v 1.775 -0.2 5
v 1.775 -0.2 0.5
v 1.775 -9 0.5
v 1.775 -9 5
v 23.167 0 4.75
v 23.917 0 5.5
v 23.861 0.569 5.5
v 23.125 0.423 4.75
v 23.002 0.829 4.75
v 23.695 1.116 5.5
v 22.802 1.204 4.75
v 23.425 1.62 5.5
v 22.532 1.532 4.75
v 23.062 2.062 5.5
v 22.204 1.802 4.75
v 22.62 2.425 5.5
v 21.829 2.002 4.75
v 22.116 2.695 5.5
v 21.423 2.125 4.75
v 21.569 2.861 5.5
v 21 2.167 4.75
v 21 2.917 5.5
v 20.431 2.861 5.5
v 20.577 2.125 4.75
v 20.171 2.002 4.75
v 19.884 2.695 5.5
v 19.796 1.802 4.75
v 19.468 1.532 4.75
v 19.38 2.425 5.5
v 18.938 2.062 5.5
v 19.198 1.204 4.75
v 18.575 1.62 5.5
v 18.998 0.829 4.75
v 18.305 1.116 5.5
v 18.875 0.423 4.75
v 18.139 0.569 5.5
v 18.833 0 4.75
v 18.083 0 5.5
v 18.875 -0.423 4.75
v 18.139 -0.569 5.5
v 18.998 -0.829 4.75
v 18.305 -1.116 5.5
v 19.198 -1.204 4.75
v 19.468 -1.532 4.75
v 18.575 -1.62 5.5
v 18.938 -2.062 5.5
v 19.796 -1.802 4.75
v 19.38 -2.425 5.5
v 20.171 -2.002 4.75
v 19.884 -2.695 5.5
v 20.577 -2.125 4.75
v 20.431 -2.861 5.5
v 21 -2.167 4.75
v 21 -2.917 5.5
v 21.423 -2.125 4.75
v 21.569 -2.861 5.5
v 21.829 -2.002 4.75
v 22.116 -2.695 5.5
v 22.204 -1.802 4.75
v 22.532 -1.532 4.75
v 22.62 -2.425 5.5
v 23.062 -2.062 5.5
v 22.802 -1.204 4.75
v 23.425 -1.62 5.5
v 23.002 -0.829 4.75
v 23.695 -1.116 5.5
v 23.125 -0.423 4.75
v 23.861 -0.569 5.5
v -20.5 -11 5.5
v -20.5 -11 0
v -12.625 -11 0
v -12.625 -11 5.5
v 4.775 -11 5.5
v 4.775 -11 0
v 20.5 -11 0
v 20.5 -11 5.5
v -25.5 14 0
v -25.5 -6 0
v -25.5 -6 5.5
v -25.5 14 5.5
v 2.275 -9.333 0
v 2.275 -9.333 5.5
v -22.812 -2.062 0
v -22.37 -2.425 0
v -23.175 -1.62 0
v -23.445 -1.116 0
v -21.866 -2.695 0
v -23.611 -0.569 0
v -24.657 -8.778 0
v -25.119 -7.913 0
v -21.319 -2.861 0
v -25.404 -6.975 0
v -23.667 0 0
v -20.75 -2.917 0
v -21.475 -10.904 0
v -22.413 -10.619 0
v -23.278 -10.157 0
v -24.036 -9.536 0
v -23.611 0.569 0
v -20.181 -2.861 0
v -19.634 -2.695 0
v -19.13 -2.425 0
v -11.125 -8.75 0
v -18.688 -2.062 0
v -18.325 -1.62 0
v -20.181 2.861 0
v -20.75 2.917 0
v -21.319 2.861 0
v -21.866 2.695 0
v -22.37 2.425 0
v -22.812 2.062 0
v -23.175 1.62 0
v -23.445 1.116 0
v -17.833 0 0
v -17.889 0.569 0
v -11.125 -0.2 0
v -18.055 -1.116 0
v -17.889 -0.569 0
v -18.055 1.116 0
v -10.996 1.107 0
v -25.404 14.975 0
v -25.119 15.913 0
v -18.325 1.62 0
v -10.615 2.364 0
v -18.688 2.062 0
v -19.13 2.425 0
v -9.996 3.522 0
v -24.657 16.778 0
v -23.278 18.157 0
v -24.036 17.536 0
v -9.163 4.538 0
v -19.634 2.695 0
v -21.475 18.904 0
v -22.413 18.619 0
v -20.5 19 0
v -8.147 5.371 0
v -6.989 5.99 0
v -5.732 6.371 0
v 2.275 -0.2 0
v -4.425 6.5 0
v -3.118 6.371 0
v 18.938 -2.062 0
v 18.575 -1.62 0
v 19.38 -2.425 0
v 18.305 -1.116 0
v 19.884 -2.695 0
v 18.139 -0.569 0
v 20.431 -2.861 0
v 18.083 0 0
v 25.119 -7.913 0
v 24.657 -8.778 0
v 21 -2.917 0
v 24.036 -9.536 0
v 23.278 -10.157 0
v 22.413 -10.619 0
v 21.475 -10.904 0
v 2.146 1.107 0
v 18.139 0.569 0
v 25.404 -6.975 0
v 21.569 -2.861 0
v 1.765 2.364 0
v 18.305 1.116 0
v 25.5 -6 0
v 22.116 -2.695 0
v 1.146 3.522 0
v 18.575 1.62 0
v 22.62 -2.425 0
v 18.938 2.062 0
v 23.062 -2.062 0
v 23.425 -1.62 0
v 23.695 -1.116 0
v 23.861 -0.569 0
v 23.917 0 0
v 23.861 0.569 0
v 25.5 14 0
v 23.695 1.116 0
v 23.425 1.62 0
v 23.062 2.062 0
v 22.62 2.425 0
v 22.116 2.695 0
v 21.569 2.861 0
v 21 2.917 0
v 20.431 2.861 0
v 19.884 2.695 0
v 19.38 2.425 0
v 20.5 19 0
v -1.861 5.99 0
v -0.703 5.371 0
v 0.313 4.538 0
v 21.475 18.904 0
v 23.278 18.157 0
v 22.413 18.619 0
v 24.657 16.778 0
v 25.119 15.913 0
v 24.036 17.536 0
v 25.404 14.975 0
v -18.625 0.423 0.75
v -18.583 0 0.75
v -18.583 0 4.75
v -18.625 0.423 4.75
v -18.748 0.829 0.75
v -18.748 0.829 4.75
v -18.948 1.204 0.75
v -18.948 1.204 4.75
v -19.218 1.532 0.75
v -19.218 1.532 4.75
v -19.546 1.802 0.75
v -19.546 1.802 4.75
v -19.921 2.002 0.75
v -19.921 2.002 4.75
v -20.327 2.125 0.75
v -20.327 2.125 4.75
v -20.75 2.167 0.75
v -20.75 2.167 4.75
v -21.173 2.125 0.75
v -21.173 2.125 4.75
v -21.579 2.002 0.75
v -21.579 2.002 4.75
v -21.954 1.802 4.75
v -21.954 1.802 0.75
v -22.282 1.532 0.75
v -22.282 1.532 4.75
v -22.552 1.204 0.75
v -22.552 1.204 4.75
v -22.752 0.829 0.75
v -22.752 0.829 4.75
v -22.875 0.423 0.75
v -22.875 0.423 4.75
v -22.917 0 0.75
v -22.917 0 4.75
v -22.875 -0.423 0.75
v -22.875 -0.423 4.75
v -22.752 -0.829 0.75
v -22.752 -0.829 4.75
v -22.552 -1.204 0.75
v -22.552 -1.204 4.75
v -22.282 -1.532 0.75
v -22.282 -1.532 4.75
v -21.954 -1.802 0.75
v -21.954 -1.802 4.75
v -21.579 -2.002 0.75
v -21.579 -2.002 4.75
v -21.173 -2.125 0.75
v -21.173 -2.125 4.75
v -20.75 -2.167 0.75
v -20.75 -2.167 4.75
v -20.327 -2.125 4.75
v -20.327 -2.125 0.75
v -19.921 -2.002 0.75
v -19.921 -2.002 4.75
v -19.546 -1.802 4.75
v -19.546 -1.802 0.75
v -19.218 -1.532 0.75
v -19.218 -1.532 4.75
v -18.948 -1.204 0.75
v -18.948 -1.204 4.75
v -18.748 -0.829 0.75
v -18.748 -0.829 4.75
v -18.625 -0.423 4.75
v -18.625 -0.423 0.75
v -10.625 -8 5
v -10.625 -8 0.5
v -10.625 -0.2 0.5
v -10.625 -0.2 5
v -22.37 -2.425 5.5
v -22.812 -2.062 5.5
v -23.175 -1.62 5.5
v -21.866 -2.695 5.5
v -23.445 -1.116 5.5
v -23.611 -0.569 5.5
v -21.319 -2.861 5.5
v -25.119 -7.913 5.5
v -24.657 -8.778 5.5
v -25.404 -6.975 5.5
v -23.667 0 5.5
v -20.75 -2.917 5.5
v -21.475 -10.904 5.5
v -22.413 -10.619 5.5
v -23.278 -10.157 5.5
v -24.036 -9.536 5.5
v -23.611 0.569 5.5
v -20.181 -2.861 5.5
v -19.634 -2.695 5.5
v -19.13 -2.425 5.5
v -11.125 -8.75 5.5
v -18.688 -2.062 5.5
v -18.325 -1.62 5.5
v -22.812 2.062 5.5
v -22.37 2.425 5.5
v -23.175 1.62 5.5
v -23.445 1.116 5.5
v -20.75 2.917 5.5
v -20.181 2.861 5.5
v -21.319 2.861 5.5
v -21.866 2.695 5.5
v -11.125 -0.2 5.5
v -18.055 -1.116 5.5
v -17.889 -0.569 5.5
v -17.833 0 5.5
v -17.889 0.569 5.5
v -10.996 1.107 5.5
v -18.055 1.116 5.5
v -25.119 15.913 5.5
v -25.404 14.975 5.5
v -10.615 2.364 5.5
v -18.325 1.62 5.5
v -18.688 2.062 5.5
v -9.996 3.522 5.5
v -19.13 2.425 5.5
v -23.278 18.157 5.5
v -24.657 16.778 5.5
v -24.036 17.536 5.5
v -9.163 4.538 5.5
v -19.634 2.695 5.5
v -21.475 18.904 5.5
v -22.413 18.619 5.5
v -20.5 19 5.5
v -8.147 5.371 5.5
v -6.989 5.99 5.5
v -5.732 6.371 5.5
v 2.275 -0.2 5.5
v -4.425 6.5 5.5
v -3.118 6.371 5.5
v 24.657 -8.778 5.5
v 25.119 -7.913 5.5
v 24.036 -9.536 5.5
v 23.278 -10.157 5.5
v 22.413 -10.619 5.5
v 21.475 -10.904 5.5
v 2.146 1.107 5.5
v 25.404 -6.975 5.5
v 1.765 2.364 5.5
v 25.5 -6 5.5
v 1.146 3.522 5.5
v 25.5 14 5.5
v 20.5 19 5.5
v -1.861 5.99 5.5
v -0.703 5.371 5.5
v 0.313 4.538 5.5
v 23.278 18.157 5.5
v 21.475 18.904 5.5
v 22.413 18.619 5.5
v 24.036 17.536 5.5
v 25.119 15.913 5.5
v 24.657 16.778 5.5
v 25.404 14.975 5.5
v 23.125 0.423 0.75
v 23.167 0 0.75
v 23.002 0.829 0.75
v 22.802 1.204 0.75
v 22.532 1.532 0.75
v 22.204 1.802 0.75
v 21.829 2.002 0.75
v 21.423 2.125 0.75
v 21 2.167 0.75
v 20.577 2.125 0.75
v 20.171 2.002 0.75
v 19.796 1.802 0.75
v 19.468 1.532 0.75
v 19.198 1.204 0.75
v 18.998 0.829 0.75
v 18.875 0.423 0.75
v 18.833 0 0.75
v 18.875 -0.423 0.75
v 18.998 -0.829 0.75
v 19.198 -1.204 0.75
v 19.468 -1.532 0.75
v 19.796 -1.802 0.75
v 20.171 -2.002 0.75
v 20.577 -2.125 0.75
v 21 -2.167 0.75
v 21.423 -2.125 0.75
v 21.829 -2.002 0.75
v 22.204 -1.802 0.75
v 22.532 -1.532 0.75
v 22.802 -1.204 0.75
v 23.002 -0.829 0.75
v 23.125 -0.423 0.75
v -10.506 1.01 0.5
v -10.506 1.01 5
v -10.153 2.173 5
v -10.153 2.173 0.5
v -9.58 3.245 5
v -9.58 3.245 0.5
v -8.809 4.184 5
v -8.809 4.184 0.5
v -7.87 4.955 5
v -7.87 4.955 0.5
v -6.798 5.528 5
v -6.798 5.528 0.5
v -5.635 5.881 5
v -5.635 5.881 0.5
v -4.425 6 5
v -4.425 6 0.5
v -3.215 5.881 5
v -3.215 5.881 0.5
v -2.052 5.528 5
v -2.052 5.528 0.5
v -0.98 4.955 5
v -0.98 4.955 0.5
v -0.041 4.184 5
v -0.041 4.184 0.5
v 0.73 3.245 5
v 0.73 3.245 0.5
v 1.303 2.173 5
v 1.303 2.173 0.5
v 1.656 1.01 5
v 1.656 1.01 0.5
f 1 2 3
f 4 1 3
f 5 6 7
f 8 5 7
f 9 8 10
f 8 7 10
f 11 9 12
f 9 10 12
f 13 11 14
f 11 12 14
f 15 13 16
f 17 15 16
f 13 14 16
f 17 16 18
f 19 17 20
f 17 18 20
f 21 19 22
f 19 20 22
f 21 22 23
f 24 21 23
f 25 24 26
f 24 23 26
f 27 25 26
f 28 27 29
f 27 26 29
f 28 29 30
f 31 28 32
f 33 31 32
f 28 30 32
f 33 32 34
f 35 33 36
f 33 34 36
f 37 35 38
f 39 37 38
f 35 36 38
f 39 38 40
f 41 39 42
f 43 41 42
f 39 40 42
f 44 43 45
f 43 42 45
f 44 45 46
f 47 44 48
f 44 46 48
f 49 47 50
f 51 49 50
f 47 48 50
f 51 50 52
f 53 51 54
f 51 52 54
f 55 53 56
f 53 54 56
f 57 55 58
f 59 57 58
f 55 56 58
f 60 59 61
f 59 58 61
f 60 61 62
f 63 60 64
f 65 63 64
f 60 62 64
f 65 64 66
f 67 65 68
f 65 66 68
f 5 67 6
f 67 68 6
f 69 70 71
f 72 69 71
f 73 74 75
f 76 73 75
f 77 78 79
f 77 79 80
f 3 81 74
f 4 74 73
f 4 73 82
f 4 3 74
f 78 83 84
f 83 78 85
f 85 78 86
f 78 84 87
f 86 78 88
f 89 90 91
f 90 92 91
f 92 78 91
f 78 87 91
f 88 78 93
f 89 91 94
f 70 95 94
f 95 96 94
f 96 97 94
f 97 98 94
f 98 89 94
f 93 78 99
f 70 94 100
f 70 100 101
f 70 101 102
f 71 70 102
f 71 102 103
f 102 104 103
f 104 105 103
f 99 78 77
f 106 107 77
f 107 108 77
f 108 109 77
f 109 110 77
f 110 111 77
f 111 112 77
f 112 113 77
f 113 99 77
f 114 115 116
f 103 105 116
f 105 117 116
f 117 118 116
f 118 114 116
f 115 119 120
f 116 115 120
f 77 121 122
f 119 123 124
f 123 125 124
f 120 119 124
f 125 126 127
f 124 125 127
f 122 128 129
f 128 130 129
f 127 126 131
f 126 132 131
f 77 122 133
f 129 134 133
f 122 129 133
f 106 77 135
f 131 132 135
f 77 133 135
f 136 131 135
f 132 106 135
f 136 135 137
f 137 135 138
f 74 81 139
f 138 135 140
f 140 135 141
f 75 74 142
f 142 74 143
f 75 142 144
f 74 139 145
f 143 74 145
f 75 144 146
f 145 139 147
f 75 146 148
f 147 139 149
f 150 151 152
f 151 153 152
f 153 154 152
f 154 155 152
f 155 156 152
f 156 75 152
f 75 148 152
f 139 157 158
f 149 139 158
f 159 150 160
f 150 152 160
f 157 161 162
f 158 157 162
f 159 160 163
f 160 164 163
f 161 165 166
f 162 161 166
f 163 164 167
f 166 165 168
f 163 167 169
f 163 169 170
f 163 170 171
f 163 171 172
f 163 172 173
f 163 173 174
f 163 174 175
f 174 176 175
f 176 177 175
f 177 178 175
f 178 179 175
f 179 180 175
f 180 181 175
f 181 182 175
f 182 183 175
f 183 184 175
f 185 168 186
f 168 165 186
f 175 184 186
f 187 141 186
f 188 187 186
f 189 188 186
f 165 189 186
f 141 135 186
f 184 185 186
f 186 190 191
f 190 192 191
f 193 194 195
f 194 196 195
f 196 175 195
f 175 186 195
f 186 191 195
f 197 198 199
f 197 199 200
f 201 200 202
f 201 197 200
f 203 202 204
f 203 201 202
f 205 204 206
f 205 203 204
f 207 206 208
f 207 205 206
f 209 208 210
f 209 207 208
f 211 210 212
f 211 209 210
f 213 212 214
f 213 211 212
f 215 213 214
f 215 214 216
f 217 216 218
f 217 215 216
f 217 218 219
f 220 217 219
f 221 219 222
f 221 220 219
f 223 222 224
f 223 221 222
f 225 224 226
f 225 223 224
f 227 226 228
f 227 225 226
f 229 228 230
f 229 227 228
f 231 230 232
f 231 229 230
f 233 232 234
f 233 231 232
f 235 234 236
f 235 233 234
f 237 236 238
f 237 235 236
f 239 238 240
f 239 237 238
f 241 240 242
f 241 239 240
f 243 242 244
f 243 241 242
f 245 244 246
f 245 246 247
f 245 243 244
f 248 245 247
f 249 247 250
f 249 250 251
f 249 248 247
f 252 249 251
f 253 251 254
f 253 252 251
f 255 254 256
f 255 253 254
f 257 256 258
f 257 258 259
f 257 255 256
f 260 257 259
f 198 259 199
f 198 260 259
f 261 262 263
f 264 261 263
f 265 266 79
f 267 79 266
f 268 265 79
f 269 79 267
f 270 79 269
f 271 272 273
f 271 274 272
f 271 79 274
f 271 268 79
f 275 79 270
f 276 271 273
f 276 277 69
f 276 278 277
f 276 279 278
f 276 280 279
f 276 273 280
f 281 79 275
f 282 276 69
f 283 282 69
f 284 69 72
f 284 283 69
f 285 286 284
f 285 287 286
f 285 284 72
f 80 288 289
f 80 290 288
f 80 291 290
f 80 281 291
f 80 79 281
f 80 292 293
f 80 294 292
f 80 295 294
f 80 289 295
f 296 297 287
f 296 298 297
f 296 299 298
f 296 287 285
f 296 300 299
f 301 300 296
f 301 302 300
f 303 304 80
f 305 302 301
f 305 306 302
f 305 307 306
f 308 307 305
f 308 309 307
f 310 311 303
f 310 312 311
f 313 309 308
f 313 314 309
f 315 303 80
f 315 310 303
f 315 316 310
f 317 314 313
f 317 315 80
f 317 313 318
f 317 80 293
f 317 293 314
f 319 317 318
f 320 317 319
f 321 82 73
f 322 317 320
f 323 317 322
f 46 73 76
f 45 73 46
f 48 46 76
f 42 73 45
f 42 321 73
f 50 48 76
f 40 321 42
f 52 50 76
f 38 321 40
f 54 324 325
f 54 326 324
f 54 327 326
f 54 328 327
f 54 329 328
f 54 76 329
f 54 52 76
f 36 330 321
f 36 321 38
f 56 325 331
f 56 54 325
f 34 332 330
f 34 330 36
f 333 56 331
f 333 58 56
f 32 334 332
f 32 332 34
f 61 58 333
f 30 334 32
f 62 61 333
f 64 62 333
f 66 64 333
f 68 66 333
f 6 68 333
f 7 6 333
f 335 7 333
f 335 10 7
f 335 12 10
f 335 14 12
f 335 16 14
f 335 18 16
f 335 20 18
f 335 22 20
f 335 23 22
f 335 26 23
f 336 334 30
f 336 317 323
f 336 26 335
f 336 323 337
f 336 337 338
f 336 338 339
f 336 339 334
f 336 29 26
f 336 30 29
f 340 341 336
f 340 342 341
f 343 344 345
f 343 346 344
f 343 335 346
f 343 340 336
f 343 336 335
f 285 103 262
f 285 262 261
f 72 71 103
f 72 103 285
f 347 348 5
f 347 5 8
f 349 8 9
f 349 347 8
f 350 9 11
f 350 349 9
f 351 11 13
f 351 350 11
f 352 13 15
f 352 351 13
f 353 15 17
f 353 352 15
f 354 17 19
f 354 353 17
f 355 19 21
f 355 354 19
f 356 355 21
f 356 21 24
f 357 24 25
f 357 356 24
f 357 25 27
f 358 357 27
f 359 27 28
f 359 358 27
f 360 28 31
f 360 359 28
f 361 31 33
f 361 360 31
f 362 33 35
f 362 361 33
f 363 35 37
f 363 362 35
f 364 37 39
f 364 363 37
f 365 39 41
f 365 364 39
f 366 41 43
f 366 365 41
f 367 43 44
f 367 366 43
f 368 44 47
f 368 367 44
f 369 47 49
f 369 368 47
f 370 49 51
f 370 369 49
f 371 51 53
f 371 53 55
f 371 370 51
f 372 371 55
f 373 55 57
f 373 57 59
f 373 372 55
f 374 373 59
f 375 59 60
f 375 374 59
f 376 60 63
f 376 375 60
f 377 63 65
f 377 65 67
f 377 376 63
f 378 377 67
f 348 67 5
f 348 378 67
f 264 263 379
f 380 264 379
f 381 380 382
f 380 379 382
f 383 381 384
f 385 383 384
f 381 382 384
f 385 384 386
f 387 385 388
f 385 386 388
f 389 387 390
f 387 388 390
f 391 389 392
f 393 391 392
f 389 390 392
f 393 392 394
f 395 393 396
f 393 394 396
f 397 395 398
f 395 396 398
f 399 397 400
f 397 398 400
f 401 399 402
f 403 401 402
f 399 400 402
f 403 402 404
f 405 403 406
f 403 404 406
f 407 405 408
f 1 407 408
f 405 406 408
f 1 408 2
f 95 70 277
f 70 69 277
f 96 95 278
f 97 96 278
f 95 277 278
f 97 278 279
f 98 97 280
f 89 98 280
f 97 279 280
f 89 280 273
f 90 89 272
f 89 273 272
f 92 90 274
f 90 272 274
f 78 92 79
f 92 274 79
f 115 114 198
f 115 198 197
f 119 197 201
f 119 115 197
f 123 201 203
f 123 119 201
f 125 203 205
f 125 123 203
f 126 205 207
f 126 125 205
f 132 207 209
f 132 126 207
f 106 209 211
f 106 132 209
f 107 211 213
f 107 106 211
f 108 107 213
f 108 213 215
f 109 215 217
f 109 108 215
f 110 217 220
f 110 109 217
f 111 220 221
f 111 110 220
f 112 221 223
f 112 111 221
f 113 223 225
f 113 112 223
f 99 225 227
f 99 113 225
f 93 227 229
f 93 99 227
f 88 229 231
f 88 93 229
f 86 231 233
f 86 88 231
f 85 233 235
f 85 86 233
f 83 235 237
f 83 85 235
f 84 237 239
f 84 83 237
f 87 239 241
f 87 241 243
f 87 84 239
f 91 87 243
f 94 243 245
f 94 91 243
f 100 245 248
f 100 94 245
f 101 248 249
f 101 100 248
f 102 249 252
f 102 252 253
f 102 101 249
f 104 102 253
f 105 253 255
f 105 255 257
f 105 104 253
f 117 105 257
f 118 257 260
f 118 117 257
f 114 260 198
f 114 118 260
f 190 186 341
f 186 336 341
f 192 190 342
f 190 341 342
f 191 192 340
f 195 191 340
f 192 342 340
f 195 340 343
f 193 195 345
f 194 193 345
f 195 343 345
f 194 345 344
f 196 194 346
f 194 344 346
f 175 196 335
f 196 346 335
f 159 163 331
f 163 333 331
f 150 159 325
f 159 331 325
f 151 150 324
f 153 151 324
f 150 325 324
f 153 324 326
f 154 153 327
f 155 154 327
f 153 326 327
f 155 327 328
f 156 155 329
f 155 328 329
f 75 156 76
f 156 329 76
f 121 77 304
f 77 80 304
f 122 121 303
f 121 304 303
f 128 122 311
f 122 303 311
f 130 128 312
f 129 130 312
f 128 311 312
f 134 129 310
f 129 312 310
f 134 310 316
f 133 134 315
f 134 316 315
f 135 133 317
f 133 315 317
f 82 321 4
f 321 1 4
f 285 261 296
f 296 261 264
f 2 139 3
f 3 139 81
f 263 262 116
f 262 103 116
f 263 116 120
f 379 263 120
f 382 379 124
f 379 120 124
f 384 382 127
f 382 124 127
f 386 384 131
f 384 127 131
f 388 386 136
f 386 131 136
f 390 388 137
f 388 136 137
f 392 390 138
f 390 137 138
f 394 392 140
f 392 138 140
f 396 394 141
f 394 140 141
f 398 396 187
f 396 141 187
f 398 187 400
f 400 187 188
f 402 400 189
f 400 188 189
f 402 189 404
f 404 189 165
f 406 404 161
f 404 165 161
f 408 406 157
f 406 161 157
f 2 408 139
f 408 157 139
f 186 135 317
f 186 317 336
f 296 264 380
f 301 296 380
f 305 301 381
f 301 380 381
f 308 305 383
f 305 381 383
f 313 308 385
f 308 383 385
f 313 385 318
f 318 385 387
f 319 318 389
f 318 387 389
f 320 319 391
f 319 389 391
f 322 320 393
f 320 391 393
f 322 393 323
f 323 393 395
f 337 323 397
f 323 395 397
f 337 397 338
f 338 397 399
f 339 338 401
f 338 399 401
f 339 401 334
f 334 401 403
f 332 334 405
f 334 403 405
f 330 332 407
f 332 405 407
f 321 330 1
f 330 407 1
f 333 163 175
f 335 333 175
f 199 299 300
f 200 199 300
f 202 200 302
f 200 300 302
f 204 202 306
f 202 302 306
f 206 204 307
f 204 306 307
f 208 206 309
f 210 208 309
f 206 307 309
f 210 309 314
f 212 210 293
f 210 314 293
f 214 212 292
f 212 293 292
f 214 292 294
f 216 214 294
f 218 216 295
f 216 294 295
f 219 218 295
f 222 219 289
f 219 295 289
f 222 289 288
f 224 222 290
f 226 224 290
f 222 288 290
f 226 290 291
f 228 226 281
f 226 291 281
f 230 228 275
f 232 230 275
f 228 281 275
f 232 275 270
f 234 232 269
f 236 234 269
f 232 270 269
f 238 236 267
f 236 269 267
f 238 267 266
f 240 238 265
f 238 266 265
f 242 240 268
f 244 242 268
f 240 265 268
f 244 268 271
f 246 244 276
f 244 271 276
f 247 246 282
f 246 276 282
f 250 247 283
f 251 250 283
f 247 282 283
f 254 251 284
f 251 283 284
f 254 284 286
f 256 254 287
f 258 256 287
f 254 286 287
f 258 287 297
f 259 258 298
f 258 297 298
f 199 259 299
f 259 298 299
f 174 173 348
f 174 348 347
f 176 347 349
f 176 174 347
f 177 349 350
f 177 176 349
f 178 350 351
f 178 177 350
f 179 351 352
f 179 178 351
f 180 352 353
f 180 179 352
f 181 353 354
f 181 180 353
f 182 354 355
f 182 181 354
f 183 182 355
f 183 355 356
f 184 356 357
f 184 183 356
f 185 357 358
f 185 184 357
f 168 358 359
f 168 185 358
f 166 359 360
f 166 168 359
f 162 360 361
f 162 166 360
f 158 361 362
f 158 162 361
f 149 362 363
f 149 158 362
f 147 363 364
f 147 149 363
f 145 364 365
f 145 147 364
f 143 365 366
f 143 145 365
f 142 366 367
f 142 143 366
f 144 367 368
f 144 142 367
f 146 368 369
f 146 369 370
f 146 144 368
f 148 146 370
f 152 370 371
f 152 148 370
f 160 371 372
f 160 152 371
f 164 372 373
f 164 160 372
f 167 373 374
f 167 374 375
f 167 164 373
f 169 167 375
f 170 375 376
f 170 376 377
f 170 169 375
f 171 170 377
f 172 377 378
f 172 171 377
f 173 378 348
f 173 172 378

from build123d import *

# Parameters (mm, degrees)
F0_R       = 2.1666665
F1_DEPTH   = 5.5
F2_SIZE    = 0.75
F3_W       = 51
F3_H       = 8
F4_DEPTH   = 5.5
F5_SIZE    = 0.5
F7_R       = 5
F8_SIZE2   = 2
F8_SIZE    = 3
F8_2_SIZE2 = 2
F8_2_SIZE  = 3


with BuildPart() as f1:
    # F0 (on Top) → F1 (new body)
    with BuildSketch(Plane.XY):
        with BuildLine():
            Line((25.5, 11), (-25.5, 11))
            Line((-25.5, 11), (-25.5, -11))
            Line((-25.5, -11), (-10.625, -11))
            Line((-10.625, -11), (-10.625, -0.2))
            ThreePointArc((-10.625, -0.2), (-4.425, 6), (1.775, -0.2))
            Line((1.775, -0.2), (1.775, -11))
            Line((1.775, -11), (25.5, -11))
            Line((25.5, -11), (25.5, 11))
        make_face()
        with Locations((-20.75, 0)):
            Circle(F0_R, mode=Mode.SUBTRACT)
        with Locations((21, 0)):
            Circle(F0_R, mode=Mode.SUBTRACT)
    extrude(amount=F1_DEPTH)

    # F2
    f2_edges = [f1.edges().sort_by_distance(p)[0] for p in [
        (-22.916666, 0, 0),
        (18.833334, 0, 0),
        (18.833334, 0, 5.5),
        (-22.916666, 0, 5.5),
    ]]
    chamfer(f2_edges, length=F2_SIZE)

    # F3 (on Top) → F4 (join, through all)
    with BuildSketch(Plane.XY):
        with Locations((0, 15)):
            Rectangle(F3_W, F3_H)
    extrude(amount=F4_DEPTH)

    # F5
    f5_edges = [f1.edges().sort_by_distance(p)[0] for p in [
        (-4.425, 6, 5.5),
        (-4.425, 6, 0),
        (-10.625, -5.6, 5.5),
        (-10.625, -5.6, 0),
        (1.775, -5.6, 0),
        (1.775, -5.6, 5.5),
    ]]
    chamfer(f5_edges, length=F5_SIZE)

    # F7
    f7_edges = [f1.edges().sort_by_distance(p)[0] for p in [
        (25.5, -11, 2.75),
        (-25.5, -11, 2.75),
        (25.5, 19, 2.75),
        (-25.5, 19, 2.75),
    ]]
    fillet(f7_edges, radius=F7_R)

    # F8
    f8_edges = [f1.edges().sort_by_distance(p)[0] for p in [
        (-10.625, -11, 2.75),
    ]]
    f8_side = f1.faces().sort_by_distance((-10.625, -5.6, 2.75))[0]
    chamfer(f8_edges, length=F8_SIZE, length2=F8_SIZE2, reference=f8_side)

    # F8#2
    f8_2_edges = [f1.edges().sort_by_distance(p)[0] for p in [
        (1.775, -11, 2.75),
    ]]
    f8_2_side = f1.faces().sort_by_distance((11.159877, -11, 2.75))[0]
    chamfer(f8_2_edges, length=F8_2_SIZE, length2=F8_2_SIZE2, reference=f8_2_side)


solid = f1.part
